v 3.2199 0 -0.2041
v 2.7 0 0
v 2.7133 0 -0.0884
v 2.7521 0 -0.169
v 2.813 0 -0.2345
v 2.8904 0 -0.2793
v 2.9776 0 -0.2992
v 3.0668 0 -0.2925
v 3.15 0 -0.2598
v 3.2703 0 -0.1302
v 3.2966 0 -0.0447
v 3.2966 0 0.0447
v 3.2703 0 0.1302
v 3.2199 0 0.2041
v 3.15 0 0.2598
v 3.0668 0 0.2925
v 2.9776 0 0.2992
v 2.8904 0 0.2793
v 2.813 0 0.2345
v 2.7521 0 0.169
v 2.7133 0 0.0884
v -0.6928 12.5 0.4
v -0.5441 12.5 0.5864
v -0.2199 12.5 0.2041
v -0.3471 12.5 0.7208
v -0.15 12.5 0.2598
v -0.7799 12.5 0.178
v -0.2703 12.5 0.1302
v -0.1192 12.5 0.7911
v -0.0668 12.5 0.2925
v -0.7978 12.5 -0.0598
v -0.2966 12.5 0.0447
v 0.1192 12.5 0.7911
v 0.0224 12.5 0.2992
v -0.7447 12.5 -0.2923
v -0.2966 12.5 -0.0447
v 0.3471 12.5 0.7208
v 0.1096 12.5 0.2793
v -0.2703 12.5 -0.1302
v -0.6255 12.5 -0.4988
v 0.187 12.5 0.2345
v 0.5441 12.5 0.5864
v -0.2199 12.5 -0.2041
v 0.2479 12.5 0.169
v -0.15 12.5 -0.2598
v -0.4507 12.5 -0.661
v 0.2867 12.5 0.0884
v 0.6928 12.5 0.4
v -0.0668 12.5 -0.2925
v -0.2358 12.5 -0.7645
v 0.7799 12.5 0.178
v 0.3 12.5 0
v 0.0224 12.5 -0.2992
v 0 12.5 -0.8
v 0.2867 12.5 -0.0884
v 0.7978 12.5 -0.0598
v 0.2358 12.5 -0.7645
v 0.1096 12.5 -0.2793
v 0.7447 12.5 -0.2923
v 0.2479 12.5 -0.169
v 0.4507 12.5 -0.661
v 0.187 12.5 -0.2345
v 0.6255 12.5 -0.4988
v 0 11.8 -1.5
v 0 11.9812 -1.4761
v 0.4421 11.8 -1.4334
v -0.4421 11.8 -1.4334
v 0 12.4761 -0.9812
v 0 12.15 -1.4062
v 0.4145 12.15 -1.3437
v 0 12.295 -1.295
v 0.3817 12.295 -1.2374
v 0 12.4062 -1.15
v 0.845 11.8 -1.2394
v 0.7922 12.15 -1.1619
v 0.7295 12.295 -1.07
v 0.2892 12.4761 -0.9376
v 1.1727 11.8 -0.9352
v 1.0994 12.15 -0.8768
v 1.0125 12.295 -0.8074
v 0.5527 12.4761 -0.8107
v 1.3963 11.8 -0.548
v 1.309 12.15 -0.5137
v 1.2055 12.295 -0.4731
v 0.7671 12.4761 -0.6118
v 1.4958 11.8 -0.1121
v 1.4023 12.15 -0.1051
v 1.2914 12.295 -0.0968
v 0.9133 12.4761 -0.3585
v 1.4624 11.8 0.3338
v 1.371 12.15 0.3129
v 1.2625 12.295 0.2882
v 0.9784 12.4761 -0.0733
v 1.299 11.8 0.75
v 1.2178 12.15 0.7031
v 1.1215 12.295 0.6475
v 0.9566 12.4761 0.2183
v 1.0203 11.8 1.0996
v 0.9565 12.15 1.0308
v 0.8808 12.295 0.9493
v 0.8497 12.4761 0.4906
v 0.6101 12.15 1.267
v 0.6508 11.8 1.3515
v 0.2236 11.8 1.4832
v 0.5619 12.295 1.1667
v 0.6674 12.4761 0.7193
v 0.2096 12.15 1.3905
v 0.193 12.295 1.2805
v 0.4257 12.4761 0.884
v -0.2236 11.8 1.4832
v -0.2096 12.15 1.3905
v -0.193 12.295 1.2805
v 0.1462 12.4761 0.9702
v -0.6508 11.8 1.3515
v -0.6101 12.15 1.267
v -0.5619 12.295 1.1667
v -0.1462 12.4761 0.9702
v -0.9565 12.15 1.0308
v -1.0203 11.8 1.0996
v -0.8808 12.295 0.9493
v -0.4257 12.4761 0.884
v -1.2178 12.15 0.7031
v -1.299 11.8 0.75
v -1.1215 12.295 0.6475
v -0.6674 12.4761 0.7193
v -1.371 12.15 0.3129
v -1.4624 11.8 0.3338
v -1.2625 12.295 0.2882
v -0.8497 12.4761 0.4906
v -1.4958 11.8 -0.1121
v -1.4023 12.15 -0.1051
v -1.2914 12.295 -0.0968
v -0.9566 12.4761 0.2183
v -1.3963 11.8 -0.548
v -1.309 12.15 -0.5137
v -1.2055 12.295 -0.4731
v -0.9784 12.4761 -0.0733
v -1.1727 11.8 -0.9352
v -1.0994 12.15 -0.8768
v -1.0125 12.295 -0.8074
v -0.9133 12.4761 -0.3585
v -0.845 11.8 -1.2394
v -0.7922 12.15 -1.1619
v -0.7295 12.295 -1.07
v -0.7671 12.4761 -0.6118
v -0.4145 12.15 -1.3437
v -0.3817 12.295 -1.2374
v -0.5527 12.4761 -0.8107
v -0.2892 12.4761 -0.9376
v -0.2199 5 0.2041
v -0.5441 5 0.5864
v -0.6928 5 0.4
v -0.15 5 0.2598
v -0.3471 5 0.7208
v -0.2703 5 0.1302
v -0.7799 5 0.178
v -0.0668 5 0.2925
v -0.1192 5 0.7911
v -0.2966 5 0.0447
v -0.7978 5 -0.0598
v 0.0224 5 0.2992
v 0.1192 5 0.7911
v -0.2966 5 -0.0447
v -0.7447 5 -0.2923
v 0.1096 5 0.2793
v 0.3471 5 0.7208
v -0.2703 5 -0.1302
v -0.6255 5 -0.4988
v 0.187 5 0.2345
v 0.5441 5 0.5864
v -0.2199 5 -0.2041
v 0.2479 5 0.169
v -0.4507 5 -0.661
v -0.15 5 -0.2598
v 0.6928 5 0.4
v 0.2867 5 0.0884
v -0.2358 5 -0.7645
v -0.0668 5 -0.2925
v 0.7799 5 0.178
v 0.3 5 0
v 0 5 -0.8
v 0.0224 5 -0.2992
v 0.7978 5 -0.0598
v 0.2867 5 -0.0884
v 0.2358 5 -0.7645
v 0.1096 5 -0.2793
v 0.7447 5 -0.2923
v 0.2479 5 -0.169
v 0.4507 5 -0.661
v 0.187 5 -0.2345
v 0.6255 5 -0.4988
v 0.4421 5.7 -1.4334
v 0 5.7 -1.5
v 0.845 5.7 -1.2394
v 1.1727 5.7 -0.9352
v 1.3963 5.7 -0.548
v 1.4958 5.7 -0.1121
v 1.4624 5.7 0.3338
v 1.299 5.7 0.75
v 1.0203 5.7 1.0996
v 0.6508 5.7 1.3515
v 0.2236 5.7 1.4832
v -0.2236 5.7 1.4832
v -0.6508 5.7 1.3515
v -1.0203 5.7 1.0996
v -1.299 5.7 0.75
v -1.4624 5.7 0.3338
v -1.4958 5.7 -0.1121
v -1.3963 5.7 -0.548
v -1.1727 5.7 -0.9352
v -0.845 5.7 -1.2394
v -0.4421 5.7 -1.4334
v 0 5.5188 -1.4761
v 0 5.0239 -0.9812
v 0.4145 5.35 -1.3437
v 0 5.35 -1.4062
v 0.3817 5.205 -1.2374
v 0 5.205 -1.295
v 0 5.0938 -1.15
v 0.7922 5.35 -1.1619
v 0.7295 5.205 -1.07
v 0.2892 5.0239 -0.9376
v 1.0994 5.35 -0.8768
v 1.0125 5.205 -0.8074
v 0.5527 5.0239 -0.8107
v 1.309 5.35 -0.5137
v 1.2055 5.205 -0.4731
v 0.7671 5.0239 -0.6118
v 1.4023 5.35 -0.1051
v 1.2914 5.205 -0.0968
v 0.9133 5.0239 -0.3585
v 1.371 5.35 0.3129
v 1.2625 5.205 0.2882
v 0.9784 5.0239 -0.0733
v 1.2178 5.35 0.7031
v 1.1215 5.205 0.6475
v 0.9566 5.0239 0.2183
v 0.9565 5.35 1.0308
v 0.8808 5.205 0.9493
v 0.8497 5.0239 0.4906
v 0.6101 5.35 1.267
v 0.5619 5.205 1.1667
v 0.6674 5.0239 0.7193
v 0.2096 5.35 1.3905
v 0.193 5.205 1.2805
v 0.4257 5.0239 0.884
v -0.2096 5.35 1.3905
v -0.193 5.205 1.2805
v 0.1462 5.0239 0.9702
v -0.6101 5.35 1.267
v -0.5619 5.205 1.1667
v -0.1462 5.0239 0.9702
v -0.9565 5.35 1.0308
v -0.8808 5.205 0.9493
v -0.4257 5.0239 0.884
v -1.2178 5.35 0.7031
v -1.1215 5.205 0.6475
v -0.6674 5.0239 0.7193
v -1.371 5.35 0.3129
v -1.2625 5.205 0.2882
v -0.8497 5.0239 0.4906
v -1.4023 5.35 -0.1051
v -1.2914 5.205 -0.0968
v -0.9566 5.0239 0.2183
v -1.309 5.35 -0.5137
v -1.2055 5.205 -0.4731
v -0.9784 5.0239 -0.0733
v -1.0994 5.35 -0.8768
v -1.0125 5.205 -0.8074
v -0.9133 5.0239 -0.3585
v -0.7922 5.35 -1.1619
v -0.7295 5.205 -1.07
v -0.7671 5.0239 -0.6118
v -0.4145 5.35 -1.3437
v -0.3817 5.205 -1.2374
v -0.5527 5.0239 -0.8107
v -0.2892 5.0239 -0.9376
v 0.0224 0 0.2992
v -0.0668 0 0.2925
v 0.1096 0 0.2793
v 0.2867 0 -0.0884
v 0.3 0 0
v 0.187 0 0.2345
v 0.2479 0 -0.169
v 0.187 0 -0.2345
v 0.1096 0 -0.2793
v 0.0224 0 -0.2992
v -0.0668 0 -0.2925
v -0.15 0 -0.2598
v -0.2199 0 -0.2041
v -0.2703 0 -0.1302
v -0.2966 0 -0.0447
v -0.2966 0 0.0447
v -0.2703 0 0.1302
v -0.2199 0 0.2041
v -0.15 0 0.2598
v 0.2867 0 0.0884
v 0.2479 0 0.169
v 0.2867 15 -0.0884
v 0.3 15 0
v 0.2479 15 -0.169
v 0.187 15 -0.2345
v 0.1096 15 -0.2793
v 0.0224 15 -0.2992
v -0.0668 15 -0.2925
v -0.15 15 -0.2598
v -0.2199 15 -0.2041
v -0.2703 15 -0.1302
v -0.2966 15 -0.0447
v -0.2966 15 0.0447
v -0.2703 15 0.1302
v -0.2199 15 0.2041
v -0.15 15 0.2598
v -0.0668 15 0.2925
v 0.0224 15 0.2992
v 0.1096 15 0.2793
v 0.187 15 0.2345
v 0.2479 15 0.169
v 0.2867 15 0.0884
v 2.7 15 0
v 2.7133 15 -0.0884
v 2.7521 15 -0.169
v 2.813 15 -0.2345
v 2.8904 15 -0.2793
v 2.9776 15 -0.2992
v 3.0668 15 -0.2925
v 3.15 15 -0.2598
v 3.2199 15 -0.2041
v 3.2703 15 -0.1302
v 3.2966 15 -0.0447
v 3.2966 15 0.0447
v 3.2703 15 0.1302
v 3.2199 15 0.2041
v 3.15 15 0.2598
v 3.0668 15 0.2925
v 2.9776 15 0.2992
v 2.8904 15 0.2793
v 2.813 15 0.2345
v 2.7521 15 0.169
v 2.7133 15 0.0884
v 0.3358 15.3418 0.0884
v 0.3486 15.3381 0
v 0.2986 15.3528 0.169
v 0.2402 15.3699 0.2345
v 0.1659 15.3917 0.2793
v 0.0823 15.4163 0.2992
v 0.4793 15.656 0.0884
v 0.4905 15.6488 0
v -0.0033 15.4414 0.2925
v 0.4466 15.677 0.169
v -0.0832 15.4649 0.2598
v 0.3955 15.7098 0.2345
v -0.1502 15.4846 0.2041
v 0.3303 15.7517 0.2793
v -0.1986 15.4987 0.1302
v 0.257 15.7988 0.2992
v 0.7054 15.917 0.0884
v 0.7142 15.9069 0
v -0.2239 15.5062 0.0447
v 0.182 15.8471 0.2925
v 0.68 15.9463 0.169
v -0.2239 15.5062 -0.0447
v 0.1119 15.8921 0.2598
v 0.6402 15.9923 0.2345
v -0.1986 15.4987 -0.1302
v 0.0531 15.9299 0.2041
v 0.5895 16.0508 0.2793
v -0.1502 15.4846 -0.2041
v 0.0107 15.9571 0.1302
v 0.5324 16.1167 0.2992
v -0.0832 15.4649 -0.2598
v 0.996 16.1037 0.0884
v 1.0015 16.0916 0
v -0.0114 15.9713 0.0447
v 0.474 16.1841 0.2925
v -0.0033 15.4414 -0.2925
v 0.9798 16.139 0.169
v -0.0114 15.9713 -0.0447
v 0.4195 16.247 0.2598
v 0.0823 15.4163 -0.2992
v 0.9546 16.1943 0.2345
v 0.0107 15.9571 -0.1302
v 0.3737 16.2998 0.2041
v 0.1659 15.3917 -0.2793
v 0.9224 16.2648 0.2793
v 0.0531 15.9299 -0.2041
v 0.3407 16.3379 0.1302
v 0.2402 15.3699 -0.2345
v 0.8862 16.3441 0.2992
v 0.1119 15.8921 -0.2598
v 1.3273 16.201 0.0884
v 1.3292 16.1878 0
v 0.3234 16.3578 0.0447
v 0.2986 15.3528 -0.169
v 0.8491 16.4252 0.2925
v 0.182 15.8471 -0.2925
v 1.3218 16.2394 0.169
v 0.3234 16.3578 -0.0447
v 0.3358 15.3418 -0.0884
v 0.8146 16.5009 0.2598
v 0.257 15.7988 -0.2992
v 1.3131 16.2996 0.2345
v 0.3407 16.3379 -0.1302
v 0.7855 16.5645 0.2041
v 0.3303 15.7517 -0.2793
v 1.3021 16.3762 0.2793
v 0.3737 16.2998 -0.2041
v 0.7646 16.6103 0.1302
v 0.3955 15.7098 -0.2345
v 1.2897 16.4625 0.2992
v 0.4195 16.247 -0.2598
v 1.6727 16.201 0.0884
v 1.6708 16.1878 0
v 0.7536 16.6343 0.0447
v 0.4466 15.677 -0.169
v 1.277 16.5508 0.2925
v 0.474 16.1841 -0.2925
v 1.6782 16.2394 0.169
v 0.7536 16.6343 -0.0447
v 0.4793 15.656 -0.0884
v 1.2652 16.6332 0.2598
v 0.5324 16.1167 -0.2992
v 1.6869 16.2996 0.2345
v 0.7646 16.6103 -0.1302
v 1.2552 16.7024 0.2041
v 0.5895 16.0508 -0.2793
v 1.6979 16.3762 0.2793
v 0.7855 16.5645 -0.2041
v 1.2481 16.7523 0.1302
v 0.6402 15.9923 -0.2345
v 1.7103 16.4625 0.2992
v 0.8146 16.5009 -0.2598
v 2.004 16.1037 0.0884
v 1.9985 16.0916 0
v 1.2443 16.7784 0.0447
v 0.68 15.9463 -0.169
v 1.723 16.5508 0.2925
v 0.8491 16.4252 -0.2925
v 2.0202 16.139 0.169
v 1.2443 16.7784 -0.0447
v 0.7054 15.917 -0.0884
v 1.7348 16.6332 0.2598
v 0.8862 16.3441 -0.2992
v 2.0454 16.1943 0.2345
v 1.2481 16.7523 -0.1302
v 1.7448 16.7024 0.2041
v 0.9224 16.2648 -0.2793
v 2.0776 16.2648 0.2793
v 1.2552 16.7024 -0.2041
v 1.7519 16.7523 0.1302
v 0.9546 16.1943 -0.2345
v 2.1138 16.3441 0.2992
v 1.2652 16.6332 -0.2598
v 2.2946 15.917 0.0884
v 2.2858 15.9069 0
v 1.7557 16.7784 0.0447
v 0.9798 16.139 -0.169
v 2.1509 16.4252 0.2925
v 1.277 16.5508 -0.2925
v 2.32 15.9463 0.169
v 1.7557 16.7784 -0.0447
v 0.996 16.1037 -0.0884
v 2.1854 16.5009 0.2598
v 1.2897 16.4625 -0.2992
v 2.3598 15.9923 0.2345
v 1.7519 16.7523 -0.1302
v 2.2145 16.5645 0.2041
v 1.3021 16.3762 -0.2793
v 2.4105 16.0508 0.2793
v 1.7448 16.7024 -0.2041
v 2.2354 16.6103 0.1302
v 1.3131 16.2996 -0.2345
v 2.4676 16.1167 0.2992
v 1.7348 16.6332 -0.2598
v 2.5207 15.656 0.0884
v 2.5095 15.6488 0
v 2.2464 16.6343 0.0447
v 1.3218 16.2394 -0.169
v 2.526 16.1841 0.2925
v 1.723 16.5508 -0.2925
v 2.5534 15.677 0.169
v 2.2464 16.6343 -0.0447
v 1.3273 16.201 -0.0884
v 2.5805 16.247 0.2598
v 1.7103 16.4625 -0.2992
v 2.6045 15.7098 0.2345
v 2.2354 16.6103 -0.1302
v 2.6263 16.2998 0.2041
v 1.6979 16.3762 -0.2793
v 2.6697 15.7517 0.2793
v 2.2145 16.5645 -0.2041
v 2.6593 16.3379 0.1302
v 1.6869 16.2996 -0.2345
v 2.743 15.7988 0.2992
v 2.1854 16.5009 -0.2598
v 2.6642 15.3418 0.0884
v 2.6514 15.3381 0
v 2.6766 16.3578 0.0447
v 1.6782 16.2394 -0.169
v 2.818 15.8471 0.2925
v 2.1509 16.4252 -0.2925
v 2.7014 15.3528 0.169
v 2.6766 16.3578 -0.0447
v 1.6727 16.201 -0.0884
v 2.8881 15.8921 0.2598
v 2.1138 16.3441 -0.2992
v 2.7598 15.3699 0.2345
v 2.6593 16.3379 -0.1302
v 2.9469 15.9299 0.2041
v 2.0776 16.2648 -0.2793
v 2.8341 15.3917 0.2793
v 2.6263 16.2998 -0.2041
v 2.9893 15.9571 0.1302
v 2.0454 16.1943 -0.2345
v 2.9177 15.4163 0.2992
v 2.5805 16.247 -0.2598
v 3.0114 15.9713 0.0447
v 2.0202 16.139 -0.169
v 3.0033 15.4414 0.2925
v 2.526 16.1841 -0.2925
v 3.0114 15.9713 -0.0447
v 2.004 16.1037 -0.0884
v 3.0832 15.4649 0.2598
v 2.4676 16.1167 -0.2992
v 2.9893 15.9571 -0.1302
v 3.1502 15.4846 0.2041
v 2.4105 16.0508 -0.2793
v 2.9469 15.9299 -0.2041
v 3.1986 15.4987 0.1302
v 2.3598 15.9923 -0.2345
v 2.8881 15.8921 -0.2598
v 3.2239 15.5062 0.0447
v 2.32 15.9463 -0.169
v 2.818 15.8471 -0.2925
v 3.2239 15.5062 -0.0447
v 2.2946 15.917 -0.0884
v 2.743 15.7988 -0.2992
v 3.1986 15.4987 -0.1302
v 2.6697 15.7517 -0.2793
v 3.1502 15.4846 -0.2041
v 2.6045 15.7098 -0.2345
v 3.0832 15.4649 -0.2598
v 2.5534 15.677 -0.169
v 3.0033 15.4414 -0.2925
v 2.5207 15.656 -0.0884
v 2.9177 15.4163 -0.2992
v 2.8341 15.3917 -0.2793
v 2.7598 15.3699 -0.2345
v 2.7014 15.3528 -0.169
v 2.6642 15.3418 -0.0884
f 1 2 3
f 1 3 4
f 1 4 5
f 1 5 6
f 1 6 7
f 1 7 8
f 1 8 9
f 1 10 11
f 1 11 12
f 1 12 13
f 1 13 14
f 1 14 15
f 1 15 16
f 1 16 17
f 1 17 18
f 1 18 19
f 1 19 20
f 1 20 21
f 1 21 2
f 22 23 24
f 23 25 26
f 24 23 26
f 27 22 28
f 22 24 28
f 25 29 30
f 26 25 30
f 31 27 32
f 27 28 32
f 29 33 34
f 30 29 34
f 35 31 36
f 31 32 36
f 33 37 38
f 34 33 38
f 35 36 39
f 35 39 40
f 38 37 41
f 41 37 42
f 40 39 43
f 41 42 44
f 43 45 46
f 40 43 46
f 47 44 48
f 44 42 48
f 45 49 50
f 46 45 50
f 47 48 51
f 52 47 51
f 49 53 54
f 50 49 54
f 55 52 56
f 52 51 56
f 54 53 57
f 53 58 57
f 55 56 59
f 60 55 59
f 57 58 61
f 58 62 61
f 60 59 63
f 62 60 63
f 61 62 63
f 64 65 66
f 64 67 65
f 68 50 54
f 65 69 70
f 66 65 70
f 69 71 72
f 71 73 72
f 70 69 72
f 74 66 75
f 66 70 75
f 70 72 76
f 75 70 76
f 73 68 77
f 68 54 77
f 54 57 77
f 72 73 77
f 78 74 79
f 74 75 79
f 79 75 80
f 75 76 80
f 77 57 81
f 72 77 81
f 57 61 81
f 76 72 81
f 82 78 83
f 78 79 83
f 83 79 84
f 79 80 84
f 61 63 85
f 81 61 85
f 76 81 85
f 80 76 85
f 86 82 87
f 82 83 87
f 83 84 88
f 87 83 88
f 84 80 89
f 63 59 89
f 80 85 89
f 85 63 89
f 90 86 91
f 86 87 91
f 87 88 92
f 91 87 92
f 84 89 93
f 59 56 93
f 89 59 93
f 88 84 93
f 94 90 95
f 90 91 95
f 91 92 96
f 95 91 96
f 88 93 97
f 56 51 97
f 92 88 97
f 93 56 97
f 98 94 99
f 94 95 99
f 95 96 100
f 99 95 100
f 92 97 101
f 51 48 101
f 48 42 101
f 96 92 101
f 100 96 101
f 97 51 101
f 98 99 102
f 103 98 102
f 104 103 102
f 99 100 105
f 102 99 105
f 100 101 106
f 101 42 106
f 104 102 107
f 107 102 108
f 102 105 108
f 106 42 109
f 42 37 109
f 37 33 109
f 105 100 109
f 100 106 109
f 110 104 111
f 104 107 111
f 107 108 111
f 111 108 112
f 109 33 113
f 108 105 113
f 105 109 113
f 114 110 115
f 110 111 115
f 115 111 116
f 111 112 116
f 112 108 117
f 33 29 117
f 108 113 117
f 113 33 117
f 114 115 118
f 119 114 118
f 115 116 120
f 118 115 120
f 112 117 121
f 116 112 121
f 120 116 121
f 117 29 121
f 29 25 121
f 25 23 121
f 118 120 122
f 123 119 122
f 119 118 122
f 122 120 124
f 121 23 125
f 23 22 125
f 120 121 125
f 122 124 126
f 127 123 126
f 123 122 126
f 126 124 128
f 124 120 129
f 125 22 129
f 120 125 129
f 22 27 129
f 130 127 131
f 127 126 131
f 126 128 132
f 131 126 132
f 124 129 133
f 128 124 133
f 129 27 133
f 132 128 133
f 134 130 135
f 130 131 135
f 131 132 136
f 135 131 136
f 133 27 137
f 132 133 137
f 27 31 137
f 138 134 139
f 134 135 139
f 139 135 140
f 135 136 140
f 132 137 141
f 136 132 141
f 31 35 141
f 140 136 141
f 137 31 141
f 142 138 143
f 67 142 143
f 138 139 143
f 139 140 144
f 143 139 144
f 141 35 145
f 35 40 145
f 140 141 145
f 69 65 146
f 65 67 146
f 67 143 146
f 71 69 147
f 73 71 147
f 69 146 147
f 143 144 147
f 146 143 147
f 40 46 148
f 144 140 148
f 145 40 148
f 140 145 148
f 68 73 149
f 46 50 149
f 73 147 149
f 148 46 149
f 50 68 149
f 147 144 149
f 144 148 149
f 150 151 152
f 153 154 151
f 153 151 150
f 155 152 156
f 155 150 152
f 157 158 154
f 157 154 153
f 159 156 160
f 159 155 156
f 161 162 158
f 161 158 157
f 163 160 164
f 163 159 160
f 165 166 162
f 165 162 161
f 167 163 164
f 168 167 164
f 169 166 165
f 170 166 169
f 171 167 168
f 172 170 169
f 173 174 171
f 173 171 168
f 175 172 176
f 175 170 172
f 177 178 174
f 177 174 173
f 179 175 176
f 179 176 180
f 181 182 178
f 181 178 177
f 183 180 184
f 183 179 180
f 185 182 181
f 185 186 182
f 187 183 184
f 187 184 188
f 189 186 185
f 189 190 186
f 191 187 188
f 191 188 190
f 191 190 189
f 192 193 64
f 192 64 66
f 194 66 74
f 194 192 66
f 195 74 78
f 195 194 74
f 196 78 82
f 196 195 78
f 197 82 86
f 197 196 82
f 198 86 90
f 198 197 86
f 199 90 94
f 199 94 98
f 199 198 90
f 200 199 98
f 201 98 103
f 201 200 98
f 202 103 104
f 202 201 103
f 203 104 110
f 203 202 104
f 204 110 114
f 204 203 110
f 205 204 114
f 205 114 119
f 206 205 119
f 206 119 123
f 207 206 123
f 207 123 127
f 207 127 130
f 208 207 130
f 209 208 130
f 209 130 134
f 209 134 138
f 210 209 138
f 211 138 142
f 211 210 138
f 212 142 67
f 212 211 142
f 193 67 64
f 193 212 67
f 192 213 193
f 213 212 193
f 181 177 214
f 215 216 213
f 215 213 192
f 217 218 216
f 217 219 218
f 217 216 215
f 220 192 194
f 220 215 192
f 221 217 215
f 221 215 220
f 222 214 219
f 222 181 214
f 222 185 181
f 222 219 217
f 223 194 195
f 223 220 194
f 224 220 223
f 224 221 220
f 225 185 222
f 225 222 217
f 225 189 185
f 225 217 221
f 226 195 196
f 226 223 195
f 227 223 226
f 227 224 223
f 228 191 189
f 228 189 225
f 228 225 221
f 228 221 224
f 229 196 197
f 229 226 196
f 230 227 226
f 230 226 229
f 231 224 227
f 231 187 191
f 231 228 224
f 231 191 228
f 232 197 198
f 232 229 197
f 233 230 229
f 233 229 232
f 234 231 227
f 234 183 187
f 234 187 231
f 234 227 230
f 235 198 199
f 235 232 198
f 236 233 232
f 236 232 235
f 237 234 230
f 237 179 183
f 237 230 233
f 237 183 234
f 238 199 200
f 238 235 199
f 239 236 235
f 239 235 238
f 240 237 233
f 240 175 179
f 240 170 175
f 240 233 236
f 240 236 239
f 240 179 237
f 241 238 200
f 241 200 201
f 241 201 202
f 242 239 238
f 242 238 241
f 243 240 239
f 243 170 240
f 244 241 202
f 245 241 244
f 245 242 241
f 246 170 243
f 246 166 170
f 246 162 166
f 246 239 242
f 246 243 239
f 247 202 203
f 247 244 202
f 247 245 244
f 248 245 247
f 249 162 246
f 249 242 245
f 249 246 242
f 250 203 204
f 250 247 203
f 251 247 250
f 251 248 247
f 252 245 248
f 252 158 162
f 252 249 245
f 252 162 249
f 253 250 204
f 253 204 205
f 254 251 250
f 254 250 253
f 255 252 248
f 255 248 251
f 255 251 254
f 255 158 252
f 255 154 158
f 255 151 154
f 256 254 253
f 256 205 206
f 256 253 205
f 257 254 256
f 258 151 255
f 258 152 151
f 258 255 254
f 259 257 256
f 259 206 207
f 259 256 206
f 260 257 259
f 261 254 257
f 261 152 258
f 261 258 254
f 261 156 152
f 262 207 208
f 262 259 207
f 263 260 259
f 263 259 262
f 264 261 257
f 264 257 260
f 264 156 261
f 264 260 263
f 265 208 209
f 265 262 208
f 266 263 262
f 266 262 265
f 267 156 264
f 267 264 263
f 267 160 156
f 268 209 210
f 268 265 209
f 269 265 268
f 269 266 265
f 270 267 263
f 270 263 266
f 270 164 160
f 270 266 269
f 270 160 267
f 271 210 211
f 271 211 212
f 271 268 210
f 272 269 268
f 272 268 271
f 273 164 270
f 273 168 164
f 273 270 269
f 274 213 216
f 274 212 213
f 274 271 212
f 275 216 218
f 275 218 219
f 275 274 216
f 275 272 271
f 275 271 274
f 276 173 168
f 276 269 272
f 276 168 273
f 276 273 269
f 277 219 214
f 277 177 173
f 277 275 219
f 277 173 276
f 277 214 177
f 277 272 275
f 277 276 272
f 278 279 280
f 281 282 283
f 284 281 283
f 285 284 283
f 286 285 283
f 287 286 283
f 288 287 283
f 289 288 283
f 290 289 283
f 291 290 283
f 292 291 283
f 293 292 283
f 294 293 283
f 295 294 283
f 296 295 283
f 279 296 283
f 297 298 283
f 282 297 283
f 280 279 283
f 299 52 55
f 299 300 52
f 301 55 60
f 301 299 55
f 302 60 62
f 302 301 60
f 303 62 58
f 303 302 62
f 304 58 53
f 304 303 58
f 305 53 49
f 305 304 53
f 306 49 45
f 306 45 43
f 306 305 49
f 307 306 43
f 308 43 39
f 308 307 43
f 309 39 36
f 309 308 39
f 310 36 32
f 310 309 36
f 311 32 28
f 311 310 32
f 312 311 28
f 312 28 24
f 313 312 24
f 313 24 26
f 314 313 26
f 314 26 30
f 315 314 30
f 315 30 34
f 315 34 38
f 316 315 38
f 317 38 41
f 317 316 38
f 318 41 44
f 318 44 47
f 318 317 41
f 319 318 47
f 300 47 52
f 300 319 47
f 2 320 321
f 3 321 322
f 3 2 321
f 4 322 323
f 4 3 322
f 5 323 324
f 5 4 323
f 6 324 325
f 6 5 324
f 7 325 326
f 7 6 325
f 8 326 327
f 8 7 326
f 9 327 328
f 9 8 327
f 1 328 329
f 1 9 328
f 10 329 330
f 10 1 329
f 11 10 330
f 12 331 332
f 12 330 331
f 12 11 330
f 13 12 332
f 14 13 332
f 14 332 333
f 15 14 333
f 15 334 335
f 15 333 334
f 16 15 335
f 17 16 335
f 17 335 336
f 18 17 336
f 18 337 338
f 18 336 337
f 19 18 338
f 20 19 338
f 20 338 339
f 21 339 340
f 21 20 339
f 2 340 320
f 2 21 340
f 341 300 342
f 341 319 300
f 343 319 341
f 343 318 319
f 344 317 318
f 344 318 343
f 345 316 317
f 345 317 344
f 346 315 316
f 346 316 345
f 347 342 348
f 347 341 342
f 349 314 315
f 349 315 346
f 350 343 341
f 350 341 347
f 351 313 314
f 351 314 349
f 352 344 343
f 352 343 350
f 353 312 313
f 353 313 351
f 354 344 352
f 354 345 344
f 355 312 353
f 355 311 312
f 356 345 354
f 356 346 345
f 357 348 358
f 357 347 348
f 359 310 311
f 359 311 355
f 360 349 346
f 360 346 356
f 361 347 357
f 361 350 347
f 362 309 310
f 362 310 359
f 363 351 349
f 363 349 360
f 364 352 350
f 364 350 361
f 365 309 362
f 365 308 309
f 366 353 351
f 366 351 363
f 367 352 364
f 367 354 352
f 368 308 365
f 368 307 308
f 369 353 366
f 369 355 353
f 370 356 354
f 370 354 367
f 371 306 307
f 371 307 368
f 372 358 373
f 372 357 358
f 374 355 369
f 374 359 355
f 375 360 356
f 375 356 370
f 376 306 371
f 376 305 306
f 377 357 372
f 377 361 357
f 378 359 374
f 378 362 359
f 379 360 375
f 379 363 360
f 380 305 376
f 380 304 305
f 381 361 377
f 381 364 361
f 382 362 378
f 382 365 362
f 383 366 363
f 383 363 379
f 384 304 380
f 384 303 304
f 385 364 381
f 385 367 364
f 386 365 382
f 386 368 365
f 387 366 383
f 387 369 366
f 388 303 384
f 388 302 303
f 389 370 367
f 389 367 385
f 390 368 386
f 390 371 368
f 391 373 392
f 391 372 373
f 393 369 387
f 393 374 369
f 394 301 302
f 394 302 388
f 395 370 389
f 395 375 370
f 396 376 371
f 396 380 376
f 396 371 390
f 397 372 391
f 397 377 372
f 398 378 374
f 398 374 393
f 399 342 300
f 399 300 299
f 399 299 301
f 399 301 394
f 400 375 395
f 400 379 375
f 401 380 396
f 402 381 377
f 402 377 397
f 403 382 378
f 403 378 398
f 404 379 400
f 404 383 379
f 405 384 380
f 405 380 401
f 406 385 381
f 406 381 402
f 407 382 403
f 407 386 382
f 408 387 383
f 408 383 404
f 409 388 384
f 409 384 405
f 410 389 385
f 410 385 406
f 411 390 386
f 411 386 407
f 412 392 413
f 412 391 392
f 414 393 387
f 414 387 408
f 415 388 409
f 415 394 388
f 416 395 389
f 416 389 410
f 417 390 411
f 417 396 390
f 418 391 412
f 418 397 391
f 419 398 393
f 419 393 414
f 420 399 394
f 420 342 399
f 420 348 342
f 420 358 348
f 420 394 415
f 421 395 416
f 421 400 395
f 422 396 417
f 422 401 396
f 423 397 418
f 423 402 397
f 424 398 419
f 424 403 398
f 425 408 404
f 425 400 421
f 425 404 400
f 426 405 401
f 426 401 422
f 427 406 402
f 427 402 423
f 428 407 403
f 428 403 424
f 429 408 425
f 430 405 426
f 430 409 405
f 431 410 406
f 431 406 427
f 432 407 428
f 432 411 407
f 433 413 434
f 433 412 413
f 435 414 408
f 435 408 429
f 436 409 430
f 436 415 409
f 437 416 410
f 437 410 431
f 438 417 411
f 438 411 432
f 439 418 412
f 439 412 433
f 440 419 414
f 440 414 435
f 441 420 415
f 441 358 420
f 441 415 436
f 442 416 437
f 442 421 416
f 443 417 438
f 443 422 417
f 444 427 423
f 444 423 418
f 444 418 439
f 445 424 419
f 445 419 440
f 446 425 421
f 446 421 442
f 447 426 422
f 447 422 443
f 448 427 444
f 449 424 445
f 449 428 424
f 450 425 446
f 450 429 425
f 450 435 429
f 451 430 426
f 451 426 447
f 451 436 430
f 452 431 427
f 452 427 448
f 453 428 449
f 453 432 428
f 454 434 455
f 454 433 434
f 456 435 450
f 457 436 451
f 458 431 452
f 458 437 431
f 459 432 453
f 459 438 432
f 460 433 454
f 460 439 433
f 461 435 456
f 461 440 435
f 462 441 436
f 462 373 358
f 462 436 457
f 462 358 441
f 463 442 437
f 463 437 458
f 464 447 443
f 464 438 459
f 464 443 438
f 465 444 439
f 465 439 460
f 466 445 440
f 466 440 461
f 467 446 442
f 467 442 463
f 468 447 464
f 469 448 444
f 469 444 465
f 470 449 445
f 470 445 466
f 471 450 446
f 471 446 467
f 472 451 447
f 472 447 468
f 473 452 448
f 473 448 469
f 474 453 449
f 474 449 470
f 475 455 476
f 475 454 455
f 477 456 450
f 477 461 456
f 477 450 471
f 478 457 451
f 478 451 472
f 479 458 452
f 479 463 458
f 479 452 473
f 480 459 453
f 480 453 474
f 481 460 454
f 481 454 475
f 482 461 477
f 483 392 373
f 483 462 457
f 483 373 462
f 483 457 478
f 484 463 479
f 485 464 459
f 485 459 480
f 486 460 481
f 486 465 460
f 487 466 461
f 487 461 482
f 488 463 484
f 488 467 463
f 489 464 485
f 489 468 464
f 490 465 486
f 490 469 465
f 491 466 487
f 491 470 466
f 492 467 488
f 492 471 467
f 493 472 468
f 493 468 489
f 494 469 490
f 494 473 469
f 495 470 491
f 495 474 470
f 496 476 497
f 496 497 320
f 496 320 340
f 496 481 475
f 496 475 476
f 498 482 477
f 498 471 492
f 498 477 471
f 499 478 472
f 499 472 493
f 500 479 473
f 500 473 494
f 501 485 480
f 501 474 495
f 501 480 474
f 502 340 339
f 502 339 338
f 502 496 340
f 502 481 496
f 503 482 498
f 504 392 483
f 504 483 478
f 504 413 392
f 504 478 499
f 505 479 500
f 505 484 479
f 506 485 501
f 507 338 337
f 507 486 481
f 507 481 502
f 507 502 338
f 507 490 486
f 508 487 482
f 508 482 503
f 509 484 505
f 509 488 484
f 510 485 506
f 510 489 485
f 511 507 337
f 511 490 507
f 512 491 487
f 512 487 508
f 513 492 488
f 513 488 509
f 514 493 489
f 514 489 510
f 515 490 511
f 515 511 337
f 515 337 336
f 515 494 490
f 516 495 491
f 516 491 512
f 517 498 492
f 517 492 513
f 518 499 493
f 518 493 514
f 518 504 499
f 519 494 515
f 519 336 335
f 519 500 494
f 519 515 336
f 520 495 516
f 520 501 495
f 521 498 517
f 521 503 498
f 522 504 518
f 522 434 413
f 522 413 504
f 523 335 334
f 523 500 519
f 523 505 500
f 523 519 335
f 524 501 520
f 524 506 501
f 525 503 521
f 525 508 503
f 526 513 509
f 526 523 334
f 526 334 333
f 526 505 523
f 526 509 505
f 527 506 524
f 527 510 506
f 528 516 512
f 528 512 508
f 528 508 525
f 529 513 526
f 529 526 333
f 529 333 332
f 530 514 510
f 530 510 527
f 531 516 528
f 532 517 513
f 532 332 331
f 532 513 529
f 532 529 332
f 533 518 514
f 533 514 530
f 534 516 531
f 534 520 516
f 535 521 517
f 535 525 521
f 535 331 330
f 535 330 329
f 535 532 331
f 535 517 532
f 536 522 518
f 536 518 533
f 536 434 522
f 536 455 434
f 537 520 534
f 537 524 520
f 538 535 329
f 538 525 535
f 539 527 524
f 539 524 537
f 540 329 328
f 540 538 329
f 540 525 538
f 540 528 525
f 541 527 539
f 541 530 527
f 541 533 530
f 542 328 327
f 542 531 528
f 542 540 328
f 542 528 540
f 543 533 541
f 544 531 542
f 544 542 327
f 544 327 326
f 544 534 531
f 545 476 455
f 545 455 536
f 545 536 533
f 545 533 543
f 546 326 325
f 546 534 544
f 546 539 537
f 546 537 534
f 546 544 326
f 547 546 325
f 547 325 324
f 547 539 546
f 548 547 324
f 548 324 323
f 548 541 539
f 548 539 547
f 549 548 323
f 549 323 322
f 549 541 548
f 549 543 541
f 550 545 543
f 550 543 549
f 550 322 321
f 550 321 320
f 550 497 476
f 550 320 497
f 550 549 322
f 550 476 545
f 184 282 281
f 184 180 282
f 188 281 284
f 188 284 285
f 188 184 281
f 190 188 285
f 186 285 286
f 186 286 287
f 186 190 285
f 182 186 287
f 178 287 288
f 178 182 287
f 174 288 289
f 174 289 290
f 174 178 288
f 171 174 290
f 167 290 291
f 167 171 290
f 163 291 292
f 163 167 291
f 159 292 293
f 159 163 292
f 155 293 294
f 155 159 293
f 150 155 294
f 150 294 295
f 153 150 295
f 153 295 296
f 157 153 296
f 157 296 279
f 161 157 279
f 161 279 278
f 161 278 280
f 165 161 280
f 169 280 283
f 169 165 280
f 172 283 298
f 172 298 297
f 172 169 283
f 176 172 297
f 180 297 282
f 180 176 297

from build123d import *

# Parameters (mm, degrees)
SKETCH_2_R      = 0.3
SKETCH_3_R      = 1.5
EXTRUDE_1_DEPTH = 7.5
FILLET_1_R      = 0.7


with BuildPart() as part:
    # По траектории1: sweep along a path in Эскиз1
    with BuildLine(Plane.XY) as sweep_1_path:
        Line((0, 0), (0, 15))
        ThreePointArc((0, 15), (1.5, 16.5), (3, 15))
        Line((3, 15), (3, 0))
    # Эскиз2 → По траектории1 (sweep)
    with BuildSketch(Plane(origin=(0, 0, 0), x_dir=(1, 0, 0), z_dir=(0, 1, 0))):
        Circle(SKETCH_2_R)
    sweep(path=sweep_1_path.line)

    # Эскиз3 → Вытянуть1 (add)
    with BuildSketch(Plane.XZ.offset(-5)):
        with Locations(Location((0, 0, 0), (0, 0, 270))):
            Circle(SKETCH_3_R)
    extrude(amount=-EXTRUDE_1_DEPTH)

    # Скругление1
    fillet_1_edges = [part.edges().sort_by_distance(p)[0] for p in [
        (0, 5, 1.5),
        (0, 12.5, 1.5),
    ]]
    fillet(fillet_1_edges, radius=FILLET_1_R)


solid = part.part
